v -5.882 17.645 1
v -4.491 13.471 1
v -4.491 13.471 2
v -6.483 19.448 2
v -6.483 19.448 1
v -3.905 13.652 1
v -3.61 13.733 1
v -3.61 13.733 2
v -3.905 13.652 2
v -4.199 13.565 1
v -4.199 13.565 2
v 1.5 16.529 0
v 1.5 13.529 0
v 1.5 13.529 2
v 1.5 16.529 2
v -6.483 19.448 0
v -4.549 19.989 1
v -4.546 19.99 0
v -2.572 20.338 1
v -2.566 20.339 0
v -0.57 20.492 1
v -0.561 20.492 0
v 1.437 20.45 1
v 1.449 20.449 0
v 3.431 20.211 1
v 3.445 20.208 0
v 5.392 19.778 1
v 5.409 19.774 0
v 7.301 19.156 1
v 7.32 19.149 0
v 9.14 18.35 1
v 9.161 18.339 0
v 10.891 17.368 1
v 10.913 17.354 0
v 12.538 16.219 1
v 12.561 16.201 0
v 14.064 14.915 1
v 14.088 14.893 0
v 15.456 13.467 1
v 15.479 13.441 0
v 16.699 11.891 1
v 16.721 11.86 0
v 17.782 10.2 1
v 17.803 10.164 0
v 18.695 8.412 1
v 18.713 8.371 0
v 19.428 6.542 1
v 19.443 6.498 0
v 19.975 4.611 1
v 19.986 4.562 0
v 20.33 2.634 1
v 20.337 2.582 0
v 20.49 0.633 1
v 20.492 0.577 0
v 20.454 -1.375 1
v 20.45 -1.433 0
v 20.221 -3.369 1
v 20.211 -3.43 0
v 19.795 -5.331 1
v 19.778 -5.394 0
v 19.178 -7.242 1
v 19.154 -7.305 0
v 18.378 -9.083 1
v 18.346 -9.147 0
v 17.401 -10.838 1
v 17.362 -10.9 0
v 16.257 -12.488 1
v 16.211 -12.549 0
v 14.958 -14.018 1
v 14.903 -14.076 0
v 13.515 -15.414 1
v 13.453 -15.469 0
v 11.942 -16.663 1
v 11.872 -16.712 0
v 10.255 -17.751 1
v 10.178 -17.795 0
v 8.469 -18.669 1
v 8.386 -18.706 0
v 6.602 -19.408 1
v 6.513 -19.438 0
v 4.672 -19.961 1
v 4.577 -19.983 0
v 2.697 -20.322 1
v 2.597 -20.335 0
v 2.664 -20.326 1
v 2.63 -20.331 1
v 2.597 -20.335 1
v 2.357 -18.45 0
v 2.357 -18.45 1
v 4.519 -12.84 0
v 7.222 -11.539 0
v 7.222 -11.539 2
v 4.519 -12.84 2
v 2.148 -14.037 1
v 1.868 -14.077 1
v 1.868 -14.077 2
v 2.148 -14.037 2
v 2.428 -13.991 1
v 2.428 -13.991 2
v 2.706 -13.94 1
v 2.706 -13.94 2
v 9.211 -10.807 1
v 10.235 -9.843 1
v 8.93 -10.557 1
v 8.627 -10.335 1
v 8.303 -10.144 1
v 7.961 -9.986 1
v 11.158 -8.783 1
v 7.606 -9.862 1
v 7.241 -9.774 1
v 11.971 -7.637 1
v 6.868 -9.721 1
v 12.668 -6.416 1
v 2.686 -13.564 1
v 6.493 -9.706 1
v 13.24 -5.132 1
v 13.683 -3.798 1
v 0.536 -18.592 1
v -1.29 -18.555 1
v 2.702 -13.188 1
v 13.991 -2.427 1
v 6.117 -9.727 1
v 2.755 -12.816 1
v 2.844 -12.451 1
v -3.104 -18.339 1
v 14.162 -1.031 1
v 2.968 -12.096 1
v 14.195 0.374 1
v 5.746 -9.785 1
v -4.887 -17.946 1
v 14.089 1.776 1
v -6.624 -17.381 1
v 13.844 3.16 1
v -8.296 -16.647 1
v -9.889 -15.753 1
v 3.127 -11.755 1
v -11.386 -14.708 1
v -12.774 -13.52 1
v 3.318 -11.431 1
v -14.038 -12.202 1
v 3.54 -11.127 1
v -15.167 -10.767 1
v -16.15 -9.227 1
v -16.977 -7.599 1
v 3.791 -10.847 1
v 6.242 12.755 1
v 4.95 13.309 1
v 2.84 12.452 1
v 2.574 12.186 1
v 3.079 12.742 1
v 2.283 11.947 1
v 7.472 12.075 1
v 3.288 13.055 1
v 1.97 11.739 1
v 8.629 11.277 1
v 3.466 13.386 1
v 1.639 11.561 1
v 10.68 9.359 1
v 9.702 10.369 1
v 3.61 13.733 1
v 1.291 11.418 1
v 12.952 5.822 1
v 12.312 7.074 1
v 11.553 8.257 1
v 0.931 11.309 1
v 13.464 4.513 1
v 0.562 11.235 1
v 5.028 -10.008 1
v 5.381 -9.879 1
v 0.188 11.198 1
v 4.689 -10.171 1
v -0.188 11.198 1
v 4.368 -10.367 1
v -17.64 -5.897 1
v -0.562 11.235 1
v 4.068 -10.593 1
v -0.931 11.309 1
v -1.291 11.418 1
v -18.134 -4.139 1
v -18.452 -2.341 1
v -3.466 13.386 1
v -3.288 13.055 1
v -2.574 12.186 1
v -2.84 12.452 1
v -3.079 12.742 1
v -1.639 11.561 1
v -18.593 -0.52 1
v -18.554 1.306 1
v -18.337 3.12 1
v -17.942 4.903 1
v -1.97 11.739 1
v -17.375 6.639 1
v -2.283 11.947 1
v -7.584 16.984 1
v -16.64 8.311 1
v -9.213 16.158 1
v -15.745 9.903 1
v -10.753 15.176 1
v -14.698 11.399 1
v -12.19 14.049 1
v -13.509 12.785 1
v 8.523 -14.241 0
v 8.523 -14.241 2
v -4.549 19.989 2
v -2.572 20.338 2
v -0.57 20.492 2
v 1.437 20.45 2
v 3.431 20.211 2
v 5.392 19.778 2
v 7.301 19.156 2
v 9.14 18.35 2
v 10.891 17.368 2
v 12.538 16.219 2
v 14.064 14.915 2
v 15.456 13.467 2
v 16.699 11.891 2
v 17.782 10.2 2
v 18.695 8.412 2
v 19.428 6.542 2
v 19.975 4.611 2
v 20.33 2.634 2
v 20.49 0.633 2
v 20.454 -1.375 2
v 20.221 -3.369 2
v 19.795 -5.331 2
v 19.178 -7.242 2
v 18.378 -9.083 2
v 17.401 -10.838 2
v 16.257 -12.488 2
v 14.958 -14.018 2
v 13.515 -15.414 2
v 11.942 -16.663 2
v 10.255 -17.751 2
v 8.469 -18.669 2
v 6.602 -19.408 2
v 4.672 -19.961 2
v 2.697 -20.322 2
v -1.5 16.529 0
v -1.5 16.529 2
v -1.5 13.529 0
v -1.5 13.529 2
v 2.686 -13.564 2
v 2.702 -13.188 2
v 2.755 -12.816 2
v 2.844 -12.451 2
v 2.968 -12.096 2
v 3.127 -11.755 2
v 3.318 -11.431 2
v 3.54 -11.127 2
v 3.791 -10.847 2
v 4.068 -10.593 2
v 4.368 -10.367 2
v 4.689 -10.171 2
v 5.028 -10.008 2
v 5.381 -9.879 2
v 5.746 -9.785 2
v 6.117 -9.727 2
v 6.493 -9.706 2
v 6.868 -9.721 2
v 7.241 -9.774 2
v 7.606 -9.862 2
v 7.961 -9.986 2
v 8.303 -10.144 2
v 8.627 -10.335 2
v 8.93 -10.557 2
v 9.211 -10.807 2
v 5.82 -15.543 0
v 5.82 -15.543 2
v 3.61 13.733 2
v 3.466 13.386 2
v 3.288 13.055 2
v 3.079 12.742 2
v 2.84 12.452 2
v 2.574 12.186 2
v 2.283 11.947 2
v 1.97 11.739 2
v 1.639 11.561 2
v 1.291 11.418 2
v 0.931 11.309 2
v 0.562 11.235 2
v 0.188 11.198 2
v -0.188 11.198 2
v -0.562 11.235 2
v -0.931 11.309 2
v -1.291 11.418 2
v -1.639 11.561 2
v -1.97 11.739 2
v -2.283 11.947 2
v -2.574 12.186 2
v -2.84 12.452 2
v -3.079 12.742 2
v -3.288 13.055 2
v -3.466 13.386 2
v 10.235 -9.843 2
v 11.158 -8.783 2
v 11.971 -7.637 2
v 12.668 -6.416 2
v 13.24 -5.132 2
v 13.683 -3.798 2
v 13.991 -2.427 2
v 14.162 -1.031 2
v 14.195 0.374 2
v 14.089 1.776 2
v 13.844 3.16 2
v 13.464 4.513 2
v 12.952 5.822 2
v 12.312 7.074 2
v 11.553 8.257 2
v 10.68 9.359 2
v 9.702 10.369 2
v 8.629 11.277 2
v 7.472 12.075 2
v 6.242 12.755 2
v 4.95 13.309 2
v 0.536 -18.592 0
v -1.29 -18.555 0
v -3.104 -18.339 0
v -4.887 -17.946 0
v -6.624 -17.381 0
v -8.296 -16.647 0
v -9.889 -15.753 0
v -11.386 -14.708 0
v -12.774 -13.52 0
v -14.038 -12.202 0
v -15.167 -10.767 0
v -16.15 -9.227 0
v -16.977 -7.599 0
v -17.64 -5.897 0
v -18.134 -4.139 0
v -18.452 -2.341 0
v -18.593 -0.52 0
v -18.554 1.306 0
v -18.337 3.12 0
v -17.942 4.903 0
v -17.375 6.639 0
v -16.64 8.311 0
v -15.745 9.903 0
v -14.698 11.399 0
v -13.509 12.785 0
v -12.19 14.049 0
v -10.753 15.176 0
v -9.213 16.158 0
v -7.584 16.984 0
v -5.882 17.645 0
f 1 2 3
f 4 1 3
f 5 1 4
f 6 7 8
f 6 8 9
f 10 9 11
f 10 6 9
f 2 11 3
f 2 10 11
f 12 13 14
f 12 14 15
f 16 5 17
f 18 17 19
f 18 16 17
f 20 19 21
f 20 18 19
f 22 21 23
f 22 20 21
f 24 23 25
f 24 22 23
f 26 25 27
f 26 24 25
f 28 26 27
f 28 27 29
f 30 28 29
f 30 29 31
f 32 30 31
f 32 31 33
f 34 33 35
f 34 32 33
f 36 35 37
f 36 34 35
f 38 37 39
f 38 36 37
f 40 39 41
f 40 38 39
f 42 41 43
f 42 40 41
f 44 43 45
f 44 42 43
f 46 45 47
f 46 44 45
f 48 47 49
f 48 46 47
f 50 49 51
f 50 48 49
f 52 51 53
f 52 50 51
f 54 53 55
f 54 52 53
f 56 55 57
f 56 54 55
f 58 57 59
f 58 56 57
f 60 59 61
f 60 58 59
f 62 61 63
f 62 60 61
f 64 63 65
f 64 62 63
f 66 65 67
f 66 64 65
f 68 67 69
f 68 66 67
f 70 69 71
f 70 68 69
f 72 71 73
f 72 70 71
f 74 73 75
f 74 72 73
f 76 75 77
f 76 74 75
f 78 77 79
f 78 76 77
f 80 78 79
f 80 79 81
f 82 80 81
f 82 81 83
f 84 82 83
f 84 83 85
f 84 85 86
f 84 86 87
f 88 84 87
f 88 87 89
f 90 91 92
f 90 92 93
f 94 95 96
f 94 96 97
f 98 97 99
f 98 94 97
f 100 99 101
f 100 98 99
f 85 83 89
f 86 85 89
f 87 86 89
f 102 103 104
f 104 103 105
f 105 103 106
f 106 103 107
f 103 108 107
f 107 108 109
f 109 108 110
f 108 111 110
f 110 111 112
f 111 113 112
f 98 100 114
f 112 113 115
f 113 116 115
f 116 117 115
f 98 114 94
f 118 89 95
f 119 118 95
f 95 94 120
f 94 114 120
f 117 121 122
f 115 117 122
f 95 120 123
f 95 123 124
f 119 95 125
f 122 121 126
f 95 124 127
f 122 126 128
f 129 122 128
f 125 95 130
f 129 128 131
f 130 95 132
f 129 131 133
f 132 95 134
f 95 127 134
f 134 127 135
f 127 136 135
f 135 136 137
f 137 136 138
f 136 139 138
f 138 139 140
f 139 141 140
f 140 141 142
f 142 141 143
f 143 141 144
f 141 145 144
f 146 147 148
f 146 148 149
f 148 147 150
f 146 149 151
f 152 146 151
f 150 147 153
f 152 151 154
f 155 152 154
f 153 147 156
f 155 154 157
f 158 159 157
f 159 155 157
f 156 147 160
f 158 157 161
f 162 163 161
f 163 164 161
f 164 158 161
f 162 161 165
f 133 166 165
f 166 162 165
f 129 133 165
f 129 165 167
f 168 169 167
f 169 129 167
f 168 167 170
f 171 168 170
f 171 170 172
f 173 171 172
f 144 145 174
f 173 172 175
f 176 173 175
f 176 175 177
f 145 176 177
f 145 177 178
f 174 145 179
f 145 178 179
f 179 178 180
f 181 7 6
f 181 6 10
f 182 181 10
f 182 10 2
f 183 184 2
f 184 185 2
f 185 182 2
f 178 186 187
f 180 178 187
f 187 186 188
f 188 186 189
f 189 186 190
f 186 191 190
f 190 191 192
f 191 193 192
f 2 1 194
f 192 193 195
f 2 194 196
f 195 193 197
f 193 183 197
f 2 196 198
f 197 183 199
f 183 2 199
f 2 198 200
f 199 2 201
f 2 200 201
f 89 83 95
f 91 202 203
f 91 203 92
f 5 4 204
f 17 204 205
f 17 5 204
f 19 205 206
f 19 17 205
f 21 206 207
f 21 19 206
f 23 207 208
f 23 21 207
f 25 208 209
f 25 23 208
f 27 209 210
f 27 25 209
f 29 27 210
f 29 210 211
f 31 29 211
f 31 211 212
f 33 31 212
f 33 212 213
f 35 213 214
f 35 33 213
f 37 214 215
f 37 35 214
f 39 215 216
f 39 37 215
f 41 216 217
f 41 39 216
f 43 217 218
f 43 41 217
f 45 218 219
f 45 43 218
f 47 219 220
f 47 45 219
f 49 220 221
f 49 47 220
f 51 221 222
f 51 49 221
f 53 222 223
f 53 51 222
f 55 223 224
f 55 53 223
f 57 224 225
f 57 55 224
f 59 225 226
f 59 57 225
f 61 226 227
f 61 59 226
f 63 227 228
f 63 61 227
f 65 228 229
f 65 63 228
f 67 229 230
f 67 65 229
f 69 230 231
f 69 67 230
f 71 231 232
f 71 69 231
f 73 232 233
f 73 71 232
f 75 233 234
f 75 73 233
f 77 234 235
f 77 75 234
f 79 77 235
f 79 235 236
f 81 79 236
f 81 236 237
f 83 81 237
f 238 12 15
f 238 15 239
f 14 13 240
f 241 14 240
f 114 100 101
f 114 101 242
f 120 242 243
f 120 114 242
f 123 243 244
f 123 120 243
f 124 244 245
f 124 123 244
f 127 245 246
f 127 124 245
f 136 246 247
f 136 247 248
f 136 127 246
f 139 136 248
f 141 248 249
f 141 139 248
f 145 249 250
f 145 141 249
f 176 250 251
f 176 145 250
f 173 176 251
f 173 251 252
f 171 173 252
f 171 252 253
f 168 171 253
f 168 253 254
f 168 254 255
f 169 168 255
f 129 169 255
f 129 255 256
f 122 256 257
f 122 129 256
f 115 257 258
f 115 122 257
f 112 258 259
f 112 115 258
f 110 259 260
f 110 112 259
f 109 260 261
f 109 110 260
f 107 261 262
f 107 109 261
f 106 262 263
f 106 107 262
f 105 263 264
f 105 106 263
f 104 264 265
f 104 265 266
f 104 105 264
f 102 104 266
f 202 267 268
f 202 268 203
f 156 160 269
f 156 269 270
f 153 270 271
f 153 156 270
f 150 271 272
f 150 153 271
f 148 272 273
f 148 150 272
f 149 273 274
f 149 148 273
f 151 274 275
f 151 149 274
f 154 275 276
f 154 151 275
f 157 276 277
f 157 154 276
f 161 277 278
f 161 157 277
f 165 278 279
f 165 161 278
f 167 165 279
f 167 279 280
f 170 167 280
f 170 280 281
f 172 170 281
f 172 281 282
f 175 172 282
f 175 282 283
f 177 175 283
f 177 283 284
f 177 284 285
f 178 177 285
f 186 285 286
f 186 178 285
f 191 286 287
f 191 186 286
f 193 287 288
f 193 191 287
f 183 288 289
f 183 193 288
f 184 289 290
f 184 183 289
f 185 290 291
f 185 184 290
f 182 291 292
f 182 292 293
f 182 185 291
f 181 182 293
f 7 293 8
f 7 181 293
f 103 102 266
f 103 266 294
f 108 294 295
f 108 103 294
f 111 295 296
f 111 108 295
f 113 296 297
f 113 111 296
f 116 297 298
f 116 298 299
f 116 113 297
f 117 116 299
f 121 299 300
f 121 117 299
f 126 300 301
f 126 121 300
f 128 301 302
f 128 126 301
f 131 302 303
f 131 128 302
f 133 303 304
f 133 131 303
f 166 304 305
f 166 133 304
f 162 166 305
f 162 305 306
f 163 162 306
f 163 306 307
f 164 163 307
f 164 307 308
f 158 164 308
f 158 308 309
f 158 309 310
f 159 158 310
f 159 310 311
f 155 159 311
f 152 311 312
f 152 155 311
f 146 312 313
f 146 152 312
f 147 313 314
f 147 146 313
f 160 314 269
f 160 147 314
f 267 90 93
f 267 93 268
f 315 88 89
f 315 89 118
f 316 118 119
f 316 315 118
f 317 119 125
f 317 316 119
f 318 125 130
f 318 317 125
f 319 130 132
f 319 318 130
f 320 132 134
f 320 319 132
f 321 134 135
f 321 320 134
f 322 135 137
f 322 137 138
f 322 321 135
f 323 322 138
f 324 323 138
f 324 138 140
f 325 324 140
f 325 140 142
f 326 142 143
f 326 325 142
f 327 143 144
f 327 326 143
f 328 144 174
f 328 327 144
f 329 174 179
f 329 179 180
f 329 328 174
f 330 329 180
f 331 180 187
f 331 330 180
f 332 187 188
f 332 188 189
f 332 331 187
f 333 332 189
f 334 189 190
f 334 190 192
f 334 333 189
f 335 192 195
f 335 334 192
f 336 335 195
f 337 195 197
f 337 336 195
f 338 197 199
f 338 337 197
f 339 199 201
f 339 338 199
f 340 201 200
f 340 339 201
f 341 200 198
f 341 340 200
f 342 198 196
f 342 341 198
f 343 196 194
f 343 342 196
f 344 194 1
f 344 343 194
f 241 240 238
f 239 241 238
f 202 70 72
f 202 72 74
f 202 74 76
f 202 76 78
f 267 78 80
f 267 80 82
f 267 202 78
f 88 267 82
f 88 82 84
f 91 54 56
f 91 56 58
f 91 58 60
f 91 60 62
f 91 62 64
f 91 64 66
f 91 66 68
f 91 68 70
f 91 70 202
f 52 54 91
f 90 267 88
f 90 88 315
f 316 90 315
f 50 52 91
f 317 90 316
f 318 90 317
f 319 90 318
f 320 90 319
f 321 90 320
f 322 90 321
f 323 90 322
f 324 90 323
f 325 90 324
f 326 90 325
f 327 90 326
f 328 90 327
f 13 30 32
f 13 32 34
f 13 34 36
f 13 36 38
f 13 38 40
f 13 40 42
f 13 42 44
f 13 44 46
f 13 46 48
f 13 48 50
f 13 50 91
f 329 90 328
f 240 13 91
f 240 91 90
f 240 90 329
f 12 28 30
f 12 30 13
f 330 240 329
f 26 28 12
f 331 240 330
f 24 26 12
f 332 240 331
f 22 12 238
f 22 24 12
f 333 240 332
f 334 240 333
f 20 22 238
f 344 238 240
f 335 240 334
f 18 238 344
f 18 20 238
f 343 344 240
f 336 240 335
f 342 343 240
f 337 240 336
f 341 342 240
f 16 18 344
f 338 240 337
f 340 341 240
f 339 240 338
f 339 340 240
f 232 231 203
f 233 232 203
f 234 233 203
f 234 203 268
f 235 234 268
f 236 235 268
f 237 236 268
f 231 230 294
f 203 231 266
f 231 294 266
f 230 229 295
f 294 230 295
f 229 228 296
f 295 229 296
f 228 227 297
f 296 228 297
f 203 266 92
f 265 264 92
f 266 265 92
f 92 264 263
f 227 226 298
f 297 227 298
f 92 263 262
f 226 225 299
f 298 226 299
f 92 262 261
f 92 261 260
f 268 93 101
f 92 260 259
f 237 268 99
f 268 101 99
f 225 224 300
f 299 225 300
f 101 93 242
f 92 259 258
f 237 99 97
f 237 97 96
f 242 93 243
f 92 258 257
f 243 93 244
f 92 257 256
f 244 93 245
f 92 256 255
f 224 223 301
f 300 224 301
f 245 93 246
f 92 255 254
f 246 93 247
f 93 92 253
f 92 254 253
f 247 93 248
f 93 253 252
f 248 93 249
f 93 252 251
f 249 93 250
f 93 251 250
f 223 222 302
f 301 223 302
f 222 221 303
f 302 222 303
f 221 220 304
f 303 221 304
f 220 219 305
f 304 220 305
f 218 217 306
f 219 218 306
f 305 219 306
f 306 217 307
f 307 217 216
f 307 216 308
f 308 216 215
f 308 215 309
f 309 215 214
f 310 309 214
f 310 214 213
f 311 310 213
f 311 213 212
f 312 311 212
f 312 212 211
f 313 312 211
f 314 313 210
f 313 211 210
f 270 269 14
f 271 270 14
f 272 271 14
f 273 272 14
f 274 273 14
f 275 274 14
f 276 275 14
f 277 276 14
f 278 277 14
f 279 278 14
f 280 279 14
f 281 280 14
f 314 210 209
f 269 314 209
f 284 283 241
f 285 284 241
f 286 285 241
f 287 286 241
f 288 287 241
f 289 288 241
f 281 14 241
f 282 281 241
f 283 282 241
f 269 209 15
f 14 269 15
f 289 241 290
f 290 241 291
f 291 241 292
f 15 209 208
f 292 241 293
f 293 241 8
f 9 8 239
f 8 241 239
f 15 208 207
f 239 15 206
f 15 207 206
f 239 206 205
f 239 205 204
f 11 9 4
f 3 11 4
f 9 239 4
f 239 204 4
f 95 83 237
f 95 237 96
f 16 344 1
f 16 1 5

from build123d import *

# Parameters (mm, degrees)
RESSALTO_EXTRUS_O1_DEPTH = 1
RESSALTO_EXTRUS_O2_DEPTH = 1
ESBO_O3_W                = 3
ESBO_O3_H                = 3
CORTE_EXTRUS_O1_DEPTH    = 3


with BuildPart() as part:
    # Esboço1 → Ressalto-extrusão1 (new body)
    with BuildSketch(Plane.XY):
        with BuildLine():
            Line((-5.882044961, 17.645439838), (-6.482899016, 19.447931004))
            ThreePointArc((-6.482899016, 19.447931004), (19.9860222, 4.561679146), (2.597250835, -20.334804845))
            Line((2.597250835, -20.334804845), (2.356530026, -18.450115616))
            ThreePointArc((2.356530026, -18.450115616), (-18.133659167, -4.138889372), (-5.882044961, 17.645439838))
        make_face()
    extrude(amount=RESSALTO_EXTRUS_O1_DEPTH)

    # Esboço2 → Ressalto-extrusão2 (add)
    with BuildSketch(Plane.XY.offset(1)):
        with BuildLine():
            Line((-4.490593465, 13.471249769), (-6.482899016, 19.447931004))
            ThreePointArc((-6.482899016, 19.447931004), (19.974805028, 4.610549218), (2.696693068, -20.321856374))
            Line((2.696693068, -20.321856374), (1.867953247, -14.076602952))
            ThreePointArc((1.867953247, -14.076602952), (2.288152222, -14.014433967), (2.706303705, -13.93972454))
            ThreePointArc((2.706303705, -13.93972454), (4.856795522, -10.085239821), (9.211162742, -10.807149529))
            ThreePointArc((9.211162742, -10.807149529), (13.843976353, 3.159797262), (3.60992442, 13.733479009))
            ThreePointArc((3.60992442, 13.733479009), (0, 11.193771705), (-3.60992442, 13.733479009))
            ThreePointArc((-3.60992442, 13.733479009), (-4.052380602, 13.609489757), (-4.490593465, 13.471249769))
        make_face()
    extrude(amount=RESSALTO_EXTRUS_O2_DEPTH)

    # Esboço3 → Corte-extrusão1 (cut, through all)
    with BuildSketch(Plane(origin=(0, 0, 0), x_dir=(-1, 0, 0), z_dir=(0, 0, -1))):
        Polygon((-7.221547804, -11.538551224), (-4.5186412, -12.840202442), (-5.820292417, -15.543109046), (-8.523199021, -14.241457828), align=None)
        with Locations((0, 15.029187597)):
            Rectangle(ESBO_O3_W, ESBO_O3_H)
    extrude(amount=-CORTE_EXTRUS_O1_DEPTH, mode=Mode.SUBTRACT)


solid = part.part
